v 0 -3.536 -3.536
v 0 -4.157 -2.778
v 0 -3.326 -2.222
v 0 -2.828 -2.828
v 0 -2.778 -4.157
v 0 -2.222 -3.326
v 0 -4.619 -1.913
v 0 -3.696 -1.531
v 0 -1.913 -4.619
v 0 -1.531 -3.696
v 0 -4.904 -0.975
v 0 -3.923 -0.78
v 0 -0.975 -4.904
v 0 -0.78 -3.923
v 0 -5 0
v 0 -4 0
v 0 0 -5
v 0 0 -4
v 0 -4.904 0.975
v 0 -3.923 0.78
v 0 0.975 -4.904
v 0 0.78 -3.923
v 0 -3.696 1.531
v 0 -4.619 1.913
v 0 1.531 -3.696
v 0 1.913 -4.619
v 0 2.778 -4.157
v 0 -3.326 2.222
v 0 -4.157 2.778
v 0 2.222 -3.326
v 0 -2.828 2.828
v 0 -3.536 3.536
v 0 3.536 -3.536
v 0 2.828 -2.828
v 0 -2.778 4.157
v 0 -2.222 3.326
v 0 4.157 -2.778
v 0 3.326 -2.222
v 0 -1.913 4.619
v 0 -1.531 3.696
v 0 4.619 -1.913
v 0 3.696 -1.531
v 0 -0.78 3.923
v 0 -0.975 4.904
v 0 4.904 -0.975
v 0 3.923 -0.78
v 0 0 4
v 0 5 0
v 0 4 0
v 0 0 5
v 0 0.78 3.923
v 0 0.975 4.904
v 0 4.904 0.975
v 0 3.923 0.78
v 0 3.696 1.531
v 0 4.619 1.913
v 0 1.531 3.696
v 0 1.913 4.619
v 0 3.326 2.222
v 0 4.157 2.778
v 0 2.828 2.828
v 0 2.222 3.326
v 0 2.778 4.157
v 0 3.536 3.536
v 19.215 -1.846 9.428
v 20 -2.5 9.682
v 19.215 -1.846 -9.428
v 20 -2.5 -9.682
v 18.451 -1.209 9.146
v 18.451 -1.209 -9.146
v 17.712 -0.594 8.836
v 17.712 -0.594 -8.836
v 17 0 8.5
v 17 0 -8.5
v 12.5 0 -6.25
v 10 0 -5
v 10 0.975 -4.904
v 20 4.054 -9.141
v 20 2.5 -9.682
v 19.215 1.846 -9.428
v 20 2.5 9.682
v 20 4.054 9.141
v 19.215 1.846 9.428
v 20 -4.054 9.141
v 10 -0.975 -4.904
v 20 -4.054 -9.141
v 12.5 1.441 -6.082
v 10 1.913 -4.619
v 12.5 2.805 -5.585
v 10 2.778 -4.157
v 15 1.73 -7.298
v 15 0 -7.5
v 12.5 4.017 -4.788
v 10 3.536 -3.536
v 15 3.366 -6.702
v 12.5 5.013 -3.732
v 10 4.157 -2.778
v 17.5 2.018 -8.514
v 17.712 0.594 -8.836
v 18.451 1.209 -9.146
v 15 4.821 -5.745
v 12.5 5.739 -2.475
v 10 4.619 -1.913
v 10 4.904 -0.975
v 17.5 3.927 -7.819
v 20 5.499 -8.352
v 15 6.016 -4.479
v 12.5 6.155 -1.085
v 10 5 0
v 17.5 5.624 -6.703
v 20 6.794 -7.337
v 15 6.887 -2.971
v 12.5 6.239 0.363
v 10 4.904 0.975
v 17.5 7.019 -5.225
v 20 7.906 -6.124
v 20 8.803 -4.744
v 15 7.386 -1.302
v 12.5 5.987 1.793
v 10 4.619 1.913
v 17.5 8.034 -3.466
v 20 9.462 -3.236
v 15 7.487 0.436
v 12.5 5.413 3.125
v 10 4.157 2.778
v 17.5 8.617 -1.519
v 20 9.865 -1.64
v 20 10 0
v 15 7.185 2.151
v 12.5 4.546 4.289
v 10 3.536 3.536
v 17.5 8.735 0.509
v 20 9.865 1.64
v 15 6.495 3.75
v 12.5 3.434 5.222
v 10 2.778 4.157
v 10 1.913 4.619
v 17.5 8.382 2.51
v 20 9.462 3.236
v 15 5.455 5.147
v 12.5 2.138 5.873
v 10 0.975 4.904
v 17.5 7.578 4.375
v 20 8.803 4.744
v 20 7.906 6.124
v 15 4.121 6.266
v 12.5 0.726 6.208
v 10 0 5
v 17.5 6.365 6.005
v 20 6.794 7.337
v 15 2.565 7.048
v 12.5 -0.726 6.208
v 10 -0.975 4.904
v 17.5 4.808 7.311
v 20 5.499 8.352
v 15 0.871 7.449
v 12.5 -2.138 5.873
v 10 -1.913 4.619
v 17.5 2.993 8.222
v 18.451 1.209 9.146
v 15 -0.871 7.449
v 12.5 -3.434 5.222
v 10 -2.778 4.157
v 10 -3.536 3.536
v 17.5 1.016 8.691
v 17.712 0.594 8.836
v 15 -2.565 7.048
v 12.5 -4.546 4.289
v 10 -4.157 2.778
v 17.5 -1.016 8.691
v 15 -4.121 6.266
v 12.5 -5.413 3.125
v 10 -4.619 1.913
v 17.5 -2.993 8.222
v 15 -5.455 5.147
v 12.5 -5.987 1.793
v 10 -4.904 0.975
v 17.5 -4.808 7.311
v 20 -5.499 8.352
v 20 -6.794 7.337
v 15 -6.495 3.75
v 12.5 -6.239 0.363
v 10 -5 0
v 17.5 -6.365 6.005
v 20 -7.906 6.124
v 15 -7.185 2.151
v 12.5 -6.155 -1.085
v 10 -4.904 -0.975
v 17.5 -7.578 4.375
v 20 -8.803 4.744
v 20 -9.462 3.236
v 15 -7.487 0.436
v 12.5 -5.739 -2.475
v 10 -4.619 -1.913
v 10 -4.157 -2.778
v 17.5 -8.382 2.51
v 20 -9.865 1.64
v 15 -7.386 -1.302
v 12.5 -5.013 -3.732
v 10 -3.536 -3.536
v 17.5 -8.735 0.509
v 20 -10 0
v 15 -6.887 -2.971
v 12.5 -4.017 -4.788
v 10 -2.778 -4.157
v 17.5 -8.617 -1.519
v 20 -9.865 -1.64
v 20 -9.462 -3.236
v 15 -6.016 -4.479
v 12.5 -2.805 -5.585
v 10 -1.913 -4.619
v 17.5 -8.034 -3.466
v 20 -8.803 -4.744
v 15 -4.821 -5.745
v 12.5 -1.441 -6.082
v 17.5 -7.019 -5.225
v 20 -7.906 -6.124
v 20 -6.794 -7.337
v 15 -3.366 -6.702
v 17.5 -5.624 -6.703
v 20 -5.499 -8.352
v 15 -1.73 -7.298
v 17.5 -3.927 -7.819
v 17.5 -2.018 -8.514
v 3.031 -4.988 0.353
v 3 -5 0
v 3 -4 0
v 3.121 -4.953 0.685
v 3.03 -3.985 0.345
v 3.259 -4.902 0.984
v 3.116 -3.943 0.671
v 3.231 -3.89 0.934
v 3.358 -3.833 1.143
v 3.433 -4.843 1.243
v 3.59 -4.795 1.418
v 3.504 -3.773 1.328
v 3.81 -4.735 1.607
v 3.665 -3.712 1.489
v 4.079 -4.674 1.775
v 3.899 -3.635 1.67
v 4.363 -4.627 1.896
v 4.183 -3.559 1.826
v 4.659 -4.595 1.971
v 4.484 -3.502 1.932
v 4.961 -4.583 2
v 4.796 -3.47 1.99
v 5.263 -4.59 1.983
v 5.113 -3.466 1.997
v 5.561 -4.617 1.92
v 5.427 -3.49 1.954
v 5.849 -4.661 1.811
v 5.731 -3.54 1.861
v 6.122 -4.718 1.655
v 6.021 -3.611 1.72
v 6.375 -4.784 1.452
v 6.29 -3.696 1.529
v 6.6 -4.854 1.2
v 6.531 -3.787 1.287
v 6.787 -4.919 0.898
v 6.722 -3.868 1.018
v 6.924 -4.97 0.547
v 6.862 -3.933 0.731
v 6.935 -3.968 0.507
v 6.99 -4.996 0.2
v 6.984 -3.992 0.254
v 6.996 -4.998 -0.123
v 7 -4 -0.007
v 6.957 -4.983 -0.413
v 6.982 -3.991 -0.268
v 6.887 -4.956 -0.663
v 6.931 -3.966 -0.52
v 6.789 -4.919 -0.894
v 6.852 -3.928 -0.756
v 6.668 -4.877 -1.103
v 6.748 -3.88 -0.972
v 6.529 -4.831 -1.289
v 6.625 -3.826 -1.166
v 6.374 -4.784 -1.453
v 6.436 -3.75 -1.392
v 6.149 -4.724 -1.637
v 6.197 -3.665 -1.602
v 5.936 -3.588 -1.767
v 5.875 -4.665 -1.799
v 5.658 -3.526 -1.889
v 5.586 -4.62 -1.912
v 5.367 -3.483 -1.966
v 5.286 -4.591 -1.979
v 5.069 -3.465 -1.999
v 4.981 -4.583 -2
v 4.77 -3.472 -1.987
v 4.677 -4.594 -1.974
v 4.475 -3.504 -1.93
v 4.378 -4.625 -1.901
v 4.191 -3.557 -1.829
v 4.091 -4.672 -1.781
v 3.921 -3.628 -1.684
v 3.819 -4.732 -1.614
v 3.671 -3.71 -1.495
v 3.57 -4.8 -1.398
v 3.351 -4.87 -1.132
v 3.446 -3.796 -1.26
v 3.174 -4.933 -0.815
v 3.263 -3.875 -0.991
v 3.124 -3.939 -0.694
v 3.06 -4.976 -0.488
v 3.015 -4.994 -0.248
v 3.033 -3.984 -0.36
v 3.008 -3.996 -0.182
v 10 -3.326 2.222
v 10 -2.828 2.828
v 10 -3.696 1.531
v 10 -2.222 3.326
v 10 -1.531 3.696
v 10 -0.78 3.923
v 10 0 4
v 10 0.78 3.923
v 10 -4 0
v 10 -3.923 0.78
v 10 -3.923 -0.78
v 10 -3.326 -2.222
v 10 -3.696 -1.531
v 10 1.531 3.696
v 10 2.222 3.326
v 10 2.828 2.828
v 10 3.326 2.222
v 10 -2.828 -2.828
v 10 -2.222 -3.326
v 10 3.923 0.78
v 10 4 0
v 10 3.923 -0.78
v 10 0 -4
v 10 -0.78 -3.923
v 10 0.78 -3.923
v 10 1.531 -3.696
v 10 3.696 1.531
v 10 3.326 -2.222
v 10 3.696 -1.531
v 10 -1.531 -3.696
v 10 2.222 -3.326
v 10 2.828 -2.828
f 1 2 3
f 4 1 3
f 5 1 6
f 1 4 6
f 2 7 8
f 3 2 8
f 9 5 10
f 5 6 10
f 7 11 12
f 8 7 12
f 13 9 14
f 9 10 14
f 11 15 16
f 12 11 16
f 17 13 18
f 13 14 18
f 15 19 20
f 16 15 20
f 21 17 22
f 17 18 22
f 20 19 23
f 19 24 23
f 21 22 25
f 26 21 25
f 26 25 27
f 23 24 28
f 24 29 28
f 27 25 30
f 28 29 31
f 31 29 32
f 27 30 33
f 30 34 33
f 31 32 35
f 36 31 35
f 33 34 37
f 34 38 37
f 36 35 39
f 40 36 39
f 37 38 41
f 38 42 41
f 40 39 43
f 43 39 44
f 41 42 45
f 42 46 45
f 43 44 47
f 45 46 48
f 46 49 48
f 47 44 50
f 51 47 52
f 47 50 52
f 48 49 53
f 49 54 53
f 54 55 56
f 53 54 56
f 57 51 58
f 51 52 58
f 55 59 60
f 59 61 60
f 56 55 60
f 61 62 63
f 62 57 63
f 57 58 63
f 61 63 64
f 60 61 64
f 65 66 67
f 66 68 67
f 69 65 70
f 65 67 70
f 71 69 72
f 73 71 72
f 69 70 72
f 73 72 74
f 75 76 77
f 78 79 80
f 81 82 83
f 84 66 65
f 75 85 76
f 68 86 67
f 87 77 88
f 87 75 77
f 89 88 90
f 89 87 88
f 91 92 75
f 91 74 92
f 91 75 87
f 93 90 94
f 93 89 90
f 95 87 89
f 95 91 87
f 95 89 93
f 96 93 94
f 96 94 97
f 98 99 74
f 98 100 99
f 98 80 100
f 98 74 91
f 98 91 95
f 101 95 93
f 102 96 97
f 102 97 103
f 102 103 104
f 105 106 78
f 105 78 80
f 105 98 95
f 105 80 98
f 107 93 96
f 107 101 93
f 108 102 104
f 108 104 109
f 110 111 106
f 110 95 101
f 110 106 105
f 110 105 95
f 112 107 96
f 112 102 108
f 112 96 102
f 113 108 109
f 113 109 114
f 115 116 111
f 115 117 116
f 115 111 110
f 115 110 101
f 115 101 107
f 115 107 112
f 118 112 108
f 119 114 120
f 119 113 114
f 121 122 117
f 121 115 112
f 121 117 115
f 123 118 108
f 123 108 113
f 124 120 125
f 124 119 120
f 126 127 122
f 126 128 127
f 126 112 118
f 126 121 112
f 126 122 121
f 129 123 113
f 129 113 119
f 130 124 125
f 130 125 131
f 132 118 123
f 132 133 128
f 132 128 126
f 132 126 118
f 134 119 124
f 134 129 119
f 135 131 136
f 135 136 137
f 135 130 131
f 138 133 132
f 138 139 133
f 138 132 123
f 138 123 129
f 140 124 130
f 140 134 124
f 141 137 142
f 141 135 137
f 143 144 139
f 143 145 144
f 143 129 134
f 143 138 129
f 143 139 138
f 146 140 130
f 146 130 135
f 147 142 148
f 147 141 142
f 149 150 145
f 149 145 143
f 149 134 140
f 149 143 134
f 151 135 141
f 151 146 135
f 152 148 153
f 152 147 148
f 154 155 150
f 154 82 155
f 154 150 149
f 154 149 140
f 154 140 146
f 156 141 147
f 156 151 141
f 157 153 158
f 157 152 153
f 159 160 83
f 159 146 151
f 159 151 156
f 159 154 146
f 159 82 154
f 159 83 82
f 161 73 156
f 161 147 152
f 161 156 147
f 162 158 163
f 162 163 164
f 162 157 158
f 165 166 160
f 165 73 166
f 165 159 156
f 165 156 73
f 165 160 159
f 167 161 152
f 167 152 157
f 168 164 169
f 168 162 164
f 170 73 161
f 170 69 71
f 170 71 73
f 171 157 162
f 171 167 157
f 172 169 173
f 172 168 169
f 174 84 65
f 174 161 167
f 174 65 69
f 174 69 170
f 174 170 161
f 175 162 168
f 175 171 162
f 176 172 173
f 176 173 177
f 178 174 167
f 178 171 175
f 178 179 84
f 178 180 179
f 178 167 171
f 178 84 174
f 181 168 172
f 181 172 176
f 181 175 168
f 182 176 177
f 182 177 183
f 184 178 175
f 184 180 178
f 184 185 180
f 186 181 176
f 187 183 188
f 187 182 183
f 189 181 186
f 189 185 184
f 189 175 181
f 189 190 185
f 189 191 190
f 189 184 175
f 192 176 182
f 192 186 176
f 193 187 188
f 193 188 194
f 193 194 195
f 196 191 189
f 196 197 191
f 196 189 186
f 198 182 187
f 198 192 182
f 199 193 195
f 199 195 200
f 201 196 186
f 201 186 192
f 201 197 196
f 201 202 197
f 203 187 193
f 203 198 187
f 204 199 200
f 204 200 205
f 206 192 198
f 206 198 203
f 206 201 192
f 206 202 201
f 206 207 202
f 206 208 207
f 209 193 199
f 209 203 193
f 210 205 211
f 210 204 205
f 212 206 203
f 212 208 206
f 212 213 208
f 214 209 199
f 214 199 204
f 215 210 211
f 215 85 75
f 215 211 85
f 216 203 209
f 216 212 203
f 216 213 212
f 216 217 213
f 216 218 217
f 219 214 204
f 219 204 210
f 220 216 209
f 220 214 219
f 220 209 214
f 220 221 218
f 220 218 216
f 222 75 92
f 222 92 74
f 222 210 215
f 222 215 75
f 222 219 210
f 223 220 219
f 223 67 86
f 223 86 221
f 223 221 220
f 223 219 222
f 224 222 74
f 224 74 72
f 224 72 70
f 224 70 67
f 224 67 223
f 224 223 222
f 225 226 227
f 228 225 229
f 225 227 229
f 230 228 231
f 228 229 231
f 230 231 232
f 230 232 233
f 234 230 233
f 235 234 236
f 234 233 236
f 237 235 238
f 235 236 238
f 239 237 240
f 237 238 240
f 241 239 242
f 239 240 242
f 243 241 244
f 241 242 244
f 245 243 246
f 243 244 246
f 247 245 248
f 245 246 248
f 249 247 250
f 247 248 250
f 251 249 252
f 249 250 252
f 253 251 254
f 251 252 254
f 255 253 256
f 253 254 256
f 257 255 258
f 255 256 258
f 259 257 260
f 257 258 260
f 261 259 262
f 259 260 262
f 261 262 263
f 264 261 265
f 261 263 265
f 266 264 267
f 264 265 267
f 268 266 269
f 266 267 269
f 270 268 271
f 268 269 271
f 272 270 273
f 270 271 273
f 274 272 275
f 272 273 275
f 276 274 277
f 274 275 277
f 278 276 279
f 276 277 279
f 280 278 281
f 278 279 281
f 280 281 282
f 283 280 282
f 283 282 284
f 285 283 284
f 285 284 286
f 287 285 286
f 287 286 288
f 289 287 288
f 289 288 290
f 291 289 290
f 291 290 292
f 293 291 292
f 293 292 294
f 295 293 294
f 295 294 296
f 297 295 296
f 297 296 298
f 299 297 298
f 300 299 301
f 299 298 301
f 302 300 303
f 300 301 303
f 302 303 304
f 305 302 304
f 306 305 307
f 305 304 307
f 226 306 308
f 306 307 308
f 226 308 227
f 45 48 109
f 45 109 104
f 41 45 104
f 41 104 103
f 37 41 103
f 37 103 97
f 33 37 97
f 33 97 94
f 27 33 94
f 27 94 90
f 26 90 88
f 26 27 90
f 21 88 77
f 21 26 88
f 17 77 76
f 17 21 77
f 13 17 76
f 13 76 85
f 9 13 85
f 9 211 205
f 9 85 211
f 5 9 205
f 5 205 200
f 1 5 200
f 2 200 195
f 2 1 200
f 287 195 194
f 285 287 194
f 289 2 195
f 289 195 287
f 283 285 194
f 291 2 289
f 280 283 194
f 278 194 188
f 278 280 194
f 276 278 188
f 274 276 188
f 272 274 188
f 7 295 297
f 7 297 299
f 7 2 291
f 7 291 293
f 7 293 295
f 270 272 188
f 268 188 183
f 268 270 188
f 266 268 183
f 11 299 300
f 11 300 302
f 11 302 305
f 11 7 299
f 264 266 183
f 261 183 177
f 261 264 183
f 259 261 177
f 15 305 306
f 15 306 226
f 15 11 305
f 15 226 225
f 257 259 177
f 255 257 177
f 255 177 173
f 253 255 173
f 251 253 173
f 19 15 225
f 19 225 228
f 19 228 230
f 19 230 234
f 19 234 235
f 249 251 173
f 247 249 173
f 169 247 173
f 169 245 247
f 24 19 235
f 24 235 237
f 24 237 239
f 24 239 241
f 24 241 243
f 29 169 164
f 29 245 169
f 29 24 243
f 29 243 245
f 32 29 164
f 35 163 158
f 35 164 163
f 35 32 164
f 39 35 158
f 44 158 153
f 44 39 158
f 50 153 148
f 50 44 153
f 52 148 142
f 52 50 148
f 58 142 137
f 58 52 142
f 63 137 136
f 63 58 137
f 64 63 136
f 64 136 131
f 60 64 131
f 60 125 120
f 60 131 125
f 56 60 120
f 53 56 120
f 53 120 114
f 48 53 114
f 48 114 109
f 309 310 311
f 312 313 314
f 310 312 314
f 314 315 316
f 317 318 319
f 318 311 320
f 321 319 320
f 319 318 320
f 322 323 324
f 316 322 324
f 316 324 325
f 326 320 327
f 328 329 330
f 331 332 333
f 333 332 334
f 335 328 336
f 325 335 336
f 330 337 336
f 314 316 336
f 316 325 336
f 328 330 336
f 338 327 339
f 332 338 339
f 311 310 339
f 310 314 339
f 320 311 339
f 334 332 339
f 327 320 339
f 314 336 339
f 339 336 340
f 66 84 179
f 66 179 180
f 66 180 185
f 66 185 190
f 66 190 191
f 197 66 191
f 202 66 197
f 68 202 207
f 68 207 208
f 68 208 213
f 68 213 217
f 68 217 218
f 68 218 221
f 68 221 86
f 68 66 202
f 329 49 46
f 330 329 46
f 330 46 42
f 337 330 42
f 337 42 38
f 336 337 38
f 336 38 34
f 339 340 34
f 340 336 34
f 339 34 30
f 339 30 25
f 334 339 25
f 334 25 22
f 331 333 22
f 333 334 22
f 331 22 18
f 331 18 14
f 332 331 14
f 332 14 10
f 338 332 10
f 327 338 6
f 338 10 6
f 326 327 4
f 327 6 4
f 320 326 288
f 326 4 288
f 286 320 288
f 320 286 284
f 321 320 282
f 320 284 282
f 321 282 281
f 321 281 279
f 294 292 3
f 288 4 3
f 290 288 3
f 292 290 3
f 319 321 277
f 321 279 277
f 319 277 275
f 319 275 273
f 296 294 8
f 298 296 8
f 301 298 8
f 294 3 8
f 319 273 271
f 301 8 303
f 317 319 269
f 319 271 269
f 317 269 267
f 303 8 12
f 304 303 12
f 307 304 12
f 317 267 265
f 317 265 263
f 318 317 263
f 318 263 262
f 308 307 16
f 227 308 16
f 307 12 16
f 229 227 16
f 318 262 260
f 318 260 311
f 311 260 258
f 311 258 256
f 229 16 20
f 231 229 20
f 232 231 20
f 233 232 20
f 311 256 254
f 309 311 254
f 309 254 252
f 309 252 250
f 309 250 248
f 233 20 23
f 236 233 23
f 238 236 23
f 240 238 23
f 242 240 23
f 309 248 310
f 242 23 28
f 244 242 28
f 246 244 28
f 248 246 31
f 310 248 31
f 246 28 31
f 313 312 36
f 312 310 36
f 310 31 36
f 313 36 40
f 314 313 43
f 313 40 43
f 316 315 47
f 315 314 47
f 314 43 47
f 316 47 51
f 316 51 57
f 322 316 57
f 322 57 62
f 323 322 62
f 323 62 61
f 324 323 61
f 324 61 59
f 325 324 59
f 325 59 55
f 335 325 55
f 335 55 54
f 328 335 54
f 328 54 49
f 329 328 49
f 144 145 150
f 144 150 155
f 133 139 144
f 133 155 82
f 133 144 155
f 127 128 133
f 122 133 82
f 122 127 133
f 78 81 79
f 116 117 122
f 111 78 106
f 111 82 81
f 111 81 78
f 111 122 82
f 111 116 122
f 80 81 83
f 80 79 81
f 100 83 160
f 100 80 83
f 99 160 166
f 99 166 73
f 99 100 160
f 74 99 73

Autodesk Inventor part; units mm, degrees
ref_plane "YZ Plane" through (0, 0, 0) normal (1, 0, 0) x (0, 1, 0)
ref_plane "XZ Plane" through (0, 0, 0) normal (0, 1, 0) x (-1, 0, 0)
ref_plane "XY Plane" through (0, 0, 0) normal (0, 0, 1) x (1, 0, 0)
sketch "Sketch1" plane through (0, 0, 0) normal (1, 0, 0) x (0, 1, 0)
  circle A0 centre (0, 0) radius 4
  circle A1 centre (0, 0) radius 5
  dimension "d0" = 8
  dimension "d1" = 10
extrude "Extrusion1" add sketch "Sketch1" along normal blind 10
sketch "Sketch2" plane through (10, 0, 0) normal (1, 0, 0) x (0, 0, -1)
  circle A0 centre (0, 0) radius 4 projected
  circle A1 centre (0, 0) radius 5 projected
extrude "Extrusion2" add sketch "Sketch2" along normal blind 10 contours A0 | A1
sketch "Sketch3" plane through (20, 0, 0) normal (1, 0, 0) x (0, 0, -1)
  circle A0 centre (0, 0) radius 10
  dimension "d6" = 20
loft "Loft1" add profiles "Sketch2", "Sketch3" contours A0 | A1 / all
sketch "Sketch4" plane through (0, 0, 0) normal (0, 0, 1) x (1, 0, 0)
  line L0 (10, 5) -> (10, -5) projected
  line L1 (20, 10) -> (20, -10) projected
  line L2 (-4, 0) -> (24, 0) projected
  line L3 (20, 2.5) -> (17, 0)
  line L4 (20, 10) -> (20, -10) projected
  line L5 (20, -2.5) -> (17, 0)
  line L6 (20, 2.5) -> (20, -2.5)
  point P0 (0, 0)
  dimension "d11" = 5
  dimension "d12" = 3
extrude "Extrusion3" cut sketch "Sketch4" along normal mid plane 20
sketch "Sketch5" plane through (0, 0, 0) normal (0, 1, 0) x (-1, 0, 0)
  line L0 (-10, -5) -> (-10, 5) projected
  line L1 (0, -5) -> (0, 5) projected
  circle A0 centre (-5, 0) radius 2
  line L2 (0, 0) -> (-10, 0)
  dimension "d15" = 4
  dimension "d16" = 5
extrude "Extrusion4" cut sketch "Sketch5" against normal up to next
thread "Thread1" size "M4x0.7" class "6H" standard "ANSI Metric M Profile" full length
properties part number "Hand" material "PC/ABS Plastic"
